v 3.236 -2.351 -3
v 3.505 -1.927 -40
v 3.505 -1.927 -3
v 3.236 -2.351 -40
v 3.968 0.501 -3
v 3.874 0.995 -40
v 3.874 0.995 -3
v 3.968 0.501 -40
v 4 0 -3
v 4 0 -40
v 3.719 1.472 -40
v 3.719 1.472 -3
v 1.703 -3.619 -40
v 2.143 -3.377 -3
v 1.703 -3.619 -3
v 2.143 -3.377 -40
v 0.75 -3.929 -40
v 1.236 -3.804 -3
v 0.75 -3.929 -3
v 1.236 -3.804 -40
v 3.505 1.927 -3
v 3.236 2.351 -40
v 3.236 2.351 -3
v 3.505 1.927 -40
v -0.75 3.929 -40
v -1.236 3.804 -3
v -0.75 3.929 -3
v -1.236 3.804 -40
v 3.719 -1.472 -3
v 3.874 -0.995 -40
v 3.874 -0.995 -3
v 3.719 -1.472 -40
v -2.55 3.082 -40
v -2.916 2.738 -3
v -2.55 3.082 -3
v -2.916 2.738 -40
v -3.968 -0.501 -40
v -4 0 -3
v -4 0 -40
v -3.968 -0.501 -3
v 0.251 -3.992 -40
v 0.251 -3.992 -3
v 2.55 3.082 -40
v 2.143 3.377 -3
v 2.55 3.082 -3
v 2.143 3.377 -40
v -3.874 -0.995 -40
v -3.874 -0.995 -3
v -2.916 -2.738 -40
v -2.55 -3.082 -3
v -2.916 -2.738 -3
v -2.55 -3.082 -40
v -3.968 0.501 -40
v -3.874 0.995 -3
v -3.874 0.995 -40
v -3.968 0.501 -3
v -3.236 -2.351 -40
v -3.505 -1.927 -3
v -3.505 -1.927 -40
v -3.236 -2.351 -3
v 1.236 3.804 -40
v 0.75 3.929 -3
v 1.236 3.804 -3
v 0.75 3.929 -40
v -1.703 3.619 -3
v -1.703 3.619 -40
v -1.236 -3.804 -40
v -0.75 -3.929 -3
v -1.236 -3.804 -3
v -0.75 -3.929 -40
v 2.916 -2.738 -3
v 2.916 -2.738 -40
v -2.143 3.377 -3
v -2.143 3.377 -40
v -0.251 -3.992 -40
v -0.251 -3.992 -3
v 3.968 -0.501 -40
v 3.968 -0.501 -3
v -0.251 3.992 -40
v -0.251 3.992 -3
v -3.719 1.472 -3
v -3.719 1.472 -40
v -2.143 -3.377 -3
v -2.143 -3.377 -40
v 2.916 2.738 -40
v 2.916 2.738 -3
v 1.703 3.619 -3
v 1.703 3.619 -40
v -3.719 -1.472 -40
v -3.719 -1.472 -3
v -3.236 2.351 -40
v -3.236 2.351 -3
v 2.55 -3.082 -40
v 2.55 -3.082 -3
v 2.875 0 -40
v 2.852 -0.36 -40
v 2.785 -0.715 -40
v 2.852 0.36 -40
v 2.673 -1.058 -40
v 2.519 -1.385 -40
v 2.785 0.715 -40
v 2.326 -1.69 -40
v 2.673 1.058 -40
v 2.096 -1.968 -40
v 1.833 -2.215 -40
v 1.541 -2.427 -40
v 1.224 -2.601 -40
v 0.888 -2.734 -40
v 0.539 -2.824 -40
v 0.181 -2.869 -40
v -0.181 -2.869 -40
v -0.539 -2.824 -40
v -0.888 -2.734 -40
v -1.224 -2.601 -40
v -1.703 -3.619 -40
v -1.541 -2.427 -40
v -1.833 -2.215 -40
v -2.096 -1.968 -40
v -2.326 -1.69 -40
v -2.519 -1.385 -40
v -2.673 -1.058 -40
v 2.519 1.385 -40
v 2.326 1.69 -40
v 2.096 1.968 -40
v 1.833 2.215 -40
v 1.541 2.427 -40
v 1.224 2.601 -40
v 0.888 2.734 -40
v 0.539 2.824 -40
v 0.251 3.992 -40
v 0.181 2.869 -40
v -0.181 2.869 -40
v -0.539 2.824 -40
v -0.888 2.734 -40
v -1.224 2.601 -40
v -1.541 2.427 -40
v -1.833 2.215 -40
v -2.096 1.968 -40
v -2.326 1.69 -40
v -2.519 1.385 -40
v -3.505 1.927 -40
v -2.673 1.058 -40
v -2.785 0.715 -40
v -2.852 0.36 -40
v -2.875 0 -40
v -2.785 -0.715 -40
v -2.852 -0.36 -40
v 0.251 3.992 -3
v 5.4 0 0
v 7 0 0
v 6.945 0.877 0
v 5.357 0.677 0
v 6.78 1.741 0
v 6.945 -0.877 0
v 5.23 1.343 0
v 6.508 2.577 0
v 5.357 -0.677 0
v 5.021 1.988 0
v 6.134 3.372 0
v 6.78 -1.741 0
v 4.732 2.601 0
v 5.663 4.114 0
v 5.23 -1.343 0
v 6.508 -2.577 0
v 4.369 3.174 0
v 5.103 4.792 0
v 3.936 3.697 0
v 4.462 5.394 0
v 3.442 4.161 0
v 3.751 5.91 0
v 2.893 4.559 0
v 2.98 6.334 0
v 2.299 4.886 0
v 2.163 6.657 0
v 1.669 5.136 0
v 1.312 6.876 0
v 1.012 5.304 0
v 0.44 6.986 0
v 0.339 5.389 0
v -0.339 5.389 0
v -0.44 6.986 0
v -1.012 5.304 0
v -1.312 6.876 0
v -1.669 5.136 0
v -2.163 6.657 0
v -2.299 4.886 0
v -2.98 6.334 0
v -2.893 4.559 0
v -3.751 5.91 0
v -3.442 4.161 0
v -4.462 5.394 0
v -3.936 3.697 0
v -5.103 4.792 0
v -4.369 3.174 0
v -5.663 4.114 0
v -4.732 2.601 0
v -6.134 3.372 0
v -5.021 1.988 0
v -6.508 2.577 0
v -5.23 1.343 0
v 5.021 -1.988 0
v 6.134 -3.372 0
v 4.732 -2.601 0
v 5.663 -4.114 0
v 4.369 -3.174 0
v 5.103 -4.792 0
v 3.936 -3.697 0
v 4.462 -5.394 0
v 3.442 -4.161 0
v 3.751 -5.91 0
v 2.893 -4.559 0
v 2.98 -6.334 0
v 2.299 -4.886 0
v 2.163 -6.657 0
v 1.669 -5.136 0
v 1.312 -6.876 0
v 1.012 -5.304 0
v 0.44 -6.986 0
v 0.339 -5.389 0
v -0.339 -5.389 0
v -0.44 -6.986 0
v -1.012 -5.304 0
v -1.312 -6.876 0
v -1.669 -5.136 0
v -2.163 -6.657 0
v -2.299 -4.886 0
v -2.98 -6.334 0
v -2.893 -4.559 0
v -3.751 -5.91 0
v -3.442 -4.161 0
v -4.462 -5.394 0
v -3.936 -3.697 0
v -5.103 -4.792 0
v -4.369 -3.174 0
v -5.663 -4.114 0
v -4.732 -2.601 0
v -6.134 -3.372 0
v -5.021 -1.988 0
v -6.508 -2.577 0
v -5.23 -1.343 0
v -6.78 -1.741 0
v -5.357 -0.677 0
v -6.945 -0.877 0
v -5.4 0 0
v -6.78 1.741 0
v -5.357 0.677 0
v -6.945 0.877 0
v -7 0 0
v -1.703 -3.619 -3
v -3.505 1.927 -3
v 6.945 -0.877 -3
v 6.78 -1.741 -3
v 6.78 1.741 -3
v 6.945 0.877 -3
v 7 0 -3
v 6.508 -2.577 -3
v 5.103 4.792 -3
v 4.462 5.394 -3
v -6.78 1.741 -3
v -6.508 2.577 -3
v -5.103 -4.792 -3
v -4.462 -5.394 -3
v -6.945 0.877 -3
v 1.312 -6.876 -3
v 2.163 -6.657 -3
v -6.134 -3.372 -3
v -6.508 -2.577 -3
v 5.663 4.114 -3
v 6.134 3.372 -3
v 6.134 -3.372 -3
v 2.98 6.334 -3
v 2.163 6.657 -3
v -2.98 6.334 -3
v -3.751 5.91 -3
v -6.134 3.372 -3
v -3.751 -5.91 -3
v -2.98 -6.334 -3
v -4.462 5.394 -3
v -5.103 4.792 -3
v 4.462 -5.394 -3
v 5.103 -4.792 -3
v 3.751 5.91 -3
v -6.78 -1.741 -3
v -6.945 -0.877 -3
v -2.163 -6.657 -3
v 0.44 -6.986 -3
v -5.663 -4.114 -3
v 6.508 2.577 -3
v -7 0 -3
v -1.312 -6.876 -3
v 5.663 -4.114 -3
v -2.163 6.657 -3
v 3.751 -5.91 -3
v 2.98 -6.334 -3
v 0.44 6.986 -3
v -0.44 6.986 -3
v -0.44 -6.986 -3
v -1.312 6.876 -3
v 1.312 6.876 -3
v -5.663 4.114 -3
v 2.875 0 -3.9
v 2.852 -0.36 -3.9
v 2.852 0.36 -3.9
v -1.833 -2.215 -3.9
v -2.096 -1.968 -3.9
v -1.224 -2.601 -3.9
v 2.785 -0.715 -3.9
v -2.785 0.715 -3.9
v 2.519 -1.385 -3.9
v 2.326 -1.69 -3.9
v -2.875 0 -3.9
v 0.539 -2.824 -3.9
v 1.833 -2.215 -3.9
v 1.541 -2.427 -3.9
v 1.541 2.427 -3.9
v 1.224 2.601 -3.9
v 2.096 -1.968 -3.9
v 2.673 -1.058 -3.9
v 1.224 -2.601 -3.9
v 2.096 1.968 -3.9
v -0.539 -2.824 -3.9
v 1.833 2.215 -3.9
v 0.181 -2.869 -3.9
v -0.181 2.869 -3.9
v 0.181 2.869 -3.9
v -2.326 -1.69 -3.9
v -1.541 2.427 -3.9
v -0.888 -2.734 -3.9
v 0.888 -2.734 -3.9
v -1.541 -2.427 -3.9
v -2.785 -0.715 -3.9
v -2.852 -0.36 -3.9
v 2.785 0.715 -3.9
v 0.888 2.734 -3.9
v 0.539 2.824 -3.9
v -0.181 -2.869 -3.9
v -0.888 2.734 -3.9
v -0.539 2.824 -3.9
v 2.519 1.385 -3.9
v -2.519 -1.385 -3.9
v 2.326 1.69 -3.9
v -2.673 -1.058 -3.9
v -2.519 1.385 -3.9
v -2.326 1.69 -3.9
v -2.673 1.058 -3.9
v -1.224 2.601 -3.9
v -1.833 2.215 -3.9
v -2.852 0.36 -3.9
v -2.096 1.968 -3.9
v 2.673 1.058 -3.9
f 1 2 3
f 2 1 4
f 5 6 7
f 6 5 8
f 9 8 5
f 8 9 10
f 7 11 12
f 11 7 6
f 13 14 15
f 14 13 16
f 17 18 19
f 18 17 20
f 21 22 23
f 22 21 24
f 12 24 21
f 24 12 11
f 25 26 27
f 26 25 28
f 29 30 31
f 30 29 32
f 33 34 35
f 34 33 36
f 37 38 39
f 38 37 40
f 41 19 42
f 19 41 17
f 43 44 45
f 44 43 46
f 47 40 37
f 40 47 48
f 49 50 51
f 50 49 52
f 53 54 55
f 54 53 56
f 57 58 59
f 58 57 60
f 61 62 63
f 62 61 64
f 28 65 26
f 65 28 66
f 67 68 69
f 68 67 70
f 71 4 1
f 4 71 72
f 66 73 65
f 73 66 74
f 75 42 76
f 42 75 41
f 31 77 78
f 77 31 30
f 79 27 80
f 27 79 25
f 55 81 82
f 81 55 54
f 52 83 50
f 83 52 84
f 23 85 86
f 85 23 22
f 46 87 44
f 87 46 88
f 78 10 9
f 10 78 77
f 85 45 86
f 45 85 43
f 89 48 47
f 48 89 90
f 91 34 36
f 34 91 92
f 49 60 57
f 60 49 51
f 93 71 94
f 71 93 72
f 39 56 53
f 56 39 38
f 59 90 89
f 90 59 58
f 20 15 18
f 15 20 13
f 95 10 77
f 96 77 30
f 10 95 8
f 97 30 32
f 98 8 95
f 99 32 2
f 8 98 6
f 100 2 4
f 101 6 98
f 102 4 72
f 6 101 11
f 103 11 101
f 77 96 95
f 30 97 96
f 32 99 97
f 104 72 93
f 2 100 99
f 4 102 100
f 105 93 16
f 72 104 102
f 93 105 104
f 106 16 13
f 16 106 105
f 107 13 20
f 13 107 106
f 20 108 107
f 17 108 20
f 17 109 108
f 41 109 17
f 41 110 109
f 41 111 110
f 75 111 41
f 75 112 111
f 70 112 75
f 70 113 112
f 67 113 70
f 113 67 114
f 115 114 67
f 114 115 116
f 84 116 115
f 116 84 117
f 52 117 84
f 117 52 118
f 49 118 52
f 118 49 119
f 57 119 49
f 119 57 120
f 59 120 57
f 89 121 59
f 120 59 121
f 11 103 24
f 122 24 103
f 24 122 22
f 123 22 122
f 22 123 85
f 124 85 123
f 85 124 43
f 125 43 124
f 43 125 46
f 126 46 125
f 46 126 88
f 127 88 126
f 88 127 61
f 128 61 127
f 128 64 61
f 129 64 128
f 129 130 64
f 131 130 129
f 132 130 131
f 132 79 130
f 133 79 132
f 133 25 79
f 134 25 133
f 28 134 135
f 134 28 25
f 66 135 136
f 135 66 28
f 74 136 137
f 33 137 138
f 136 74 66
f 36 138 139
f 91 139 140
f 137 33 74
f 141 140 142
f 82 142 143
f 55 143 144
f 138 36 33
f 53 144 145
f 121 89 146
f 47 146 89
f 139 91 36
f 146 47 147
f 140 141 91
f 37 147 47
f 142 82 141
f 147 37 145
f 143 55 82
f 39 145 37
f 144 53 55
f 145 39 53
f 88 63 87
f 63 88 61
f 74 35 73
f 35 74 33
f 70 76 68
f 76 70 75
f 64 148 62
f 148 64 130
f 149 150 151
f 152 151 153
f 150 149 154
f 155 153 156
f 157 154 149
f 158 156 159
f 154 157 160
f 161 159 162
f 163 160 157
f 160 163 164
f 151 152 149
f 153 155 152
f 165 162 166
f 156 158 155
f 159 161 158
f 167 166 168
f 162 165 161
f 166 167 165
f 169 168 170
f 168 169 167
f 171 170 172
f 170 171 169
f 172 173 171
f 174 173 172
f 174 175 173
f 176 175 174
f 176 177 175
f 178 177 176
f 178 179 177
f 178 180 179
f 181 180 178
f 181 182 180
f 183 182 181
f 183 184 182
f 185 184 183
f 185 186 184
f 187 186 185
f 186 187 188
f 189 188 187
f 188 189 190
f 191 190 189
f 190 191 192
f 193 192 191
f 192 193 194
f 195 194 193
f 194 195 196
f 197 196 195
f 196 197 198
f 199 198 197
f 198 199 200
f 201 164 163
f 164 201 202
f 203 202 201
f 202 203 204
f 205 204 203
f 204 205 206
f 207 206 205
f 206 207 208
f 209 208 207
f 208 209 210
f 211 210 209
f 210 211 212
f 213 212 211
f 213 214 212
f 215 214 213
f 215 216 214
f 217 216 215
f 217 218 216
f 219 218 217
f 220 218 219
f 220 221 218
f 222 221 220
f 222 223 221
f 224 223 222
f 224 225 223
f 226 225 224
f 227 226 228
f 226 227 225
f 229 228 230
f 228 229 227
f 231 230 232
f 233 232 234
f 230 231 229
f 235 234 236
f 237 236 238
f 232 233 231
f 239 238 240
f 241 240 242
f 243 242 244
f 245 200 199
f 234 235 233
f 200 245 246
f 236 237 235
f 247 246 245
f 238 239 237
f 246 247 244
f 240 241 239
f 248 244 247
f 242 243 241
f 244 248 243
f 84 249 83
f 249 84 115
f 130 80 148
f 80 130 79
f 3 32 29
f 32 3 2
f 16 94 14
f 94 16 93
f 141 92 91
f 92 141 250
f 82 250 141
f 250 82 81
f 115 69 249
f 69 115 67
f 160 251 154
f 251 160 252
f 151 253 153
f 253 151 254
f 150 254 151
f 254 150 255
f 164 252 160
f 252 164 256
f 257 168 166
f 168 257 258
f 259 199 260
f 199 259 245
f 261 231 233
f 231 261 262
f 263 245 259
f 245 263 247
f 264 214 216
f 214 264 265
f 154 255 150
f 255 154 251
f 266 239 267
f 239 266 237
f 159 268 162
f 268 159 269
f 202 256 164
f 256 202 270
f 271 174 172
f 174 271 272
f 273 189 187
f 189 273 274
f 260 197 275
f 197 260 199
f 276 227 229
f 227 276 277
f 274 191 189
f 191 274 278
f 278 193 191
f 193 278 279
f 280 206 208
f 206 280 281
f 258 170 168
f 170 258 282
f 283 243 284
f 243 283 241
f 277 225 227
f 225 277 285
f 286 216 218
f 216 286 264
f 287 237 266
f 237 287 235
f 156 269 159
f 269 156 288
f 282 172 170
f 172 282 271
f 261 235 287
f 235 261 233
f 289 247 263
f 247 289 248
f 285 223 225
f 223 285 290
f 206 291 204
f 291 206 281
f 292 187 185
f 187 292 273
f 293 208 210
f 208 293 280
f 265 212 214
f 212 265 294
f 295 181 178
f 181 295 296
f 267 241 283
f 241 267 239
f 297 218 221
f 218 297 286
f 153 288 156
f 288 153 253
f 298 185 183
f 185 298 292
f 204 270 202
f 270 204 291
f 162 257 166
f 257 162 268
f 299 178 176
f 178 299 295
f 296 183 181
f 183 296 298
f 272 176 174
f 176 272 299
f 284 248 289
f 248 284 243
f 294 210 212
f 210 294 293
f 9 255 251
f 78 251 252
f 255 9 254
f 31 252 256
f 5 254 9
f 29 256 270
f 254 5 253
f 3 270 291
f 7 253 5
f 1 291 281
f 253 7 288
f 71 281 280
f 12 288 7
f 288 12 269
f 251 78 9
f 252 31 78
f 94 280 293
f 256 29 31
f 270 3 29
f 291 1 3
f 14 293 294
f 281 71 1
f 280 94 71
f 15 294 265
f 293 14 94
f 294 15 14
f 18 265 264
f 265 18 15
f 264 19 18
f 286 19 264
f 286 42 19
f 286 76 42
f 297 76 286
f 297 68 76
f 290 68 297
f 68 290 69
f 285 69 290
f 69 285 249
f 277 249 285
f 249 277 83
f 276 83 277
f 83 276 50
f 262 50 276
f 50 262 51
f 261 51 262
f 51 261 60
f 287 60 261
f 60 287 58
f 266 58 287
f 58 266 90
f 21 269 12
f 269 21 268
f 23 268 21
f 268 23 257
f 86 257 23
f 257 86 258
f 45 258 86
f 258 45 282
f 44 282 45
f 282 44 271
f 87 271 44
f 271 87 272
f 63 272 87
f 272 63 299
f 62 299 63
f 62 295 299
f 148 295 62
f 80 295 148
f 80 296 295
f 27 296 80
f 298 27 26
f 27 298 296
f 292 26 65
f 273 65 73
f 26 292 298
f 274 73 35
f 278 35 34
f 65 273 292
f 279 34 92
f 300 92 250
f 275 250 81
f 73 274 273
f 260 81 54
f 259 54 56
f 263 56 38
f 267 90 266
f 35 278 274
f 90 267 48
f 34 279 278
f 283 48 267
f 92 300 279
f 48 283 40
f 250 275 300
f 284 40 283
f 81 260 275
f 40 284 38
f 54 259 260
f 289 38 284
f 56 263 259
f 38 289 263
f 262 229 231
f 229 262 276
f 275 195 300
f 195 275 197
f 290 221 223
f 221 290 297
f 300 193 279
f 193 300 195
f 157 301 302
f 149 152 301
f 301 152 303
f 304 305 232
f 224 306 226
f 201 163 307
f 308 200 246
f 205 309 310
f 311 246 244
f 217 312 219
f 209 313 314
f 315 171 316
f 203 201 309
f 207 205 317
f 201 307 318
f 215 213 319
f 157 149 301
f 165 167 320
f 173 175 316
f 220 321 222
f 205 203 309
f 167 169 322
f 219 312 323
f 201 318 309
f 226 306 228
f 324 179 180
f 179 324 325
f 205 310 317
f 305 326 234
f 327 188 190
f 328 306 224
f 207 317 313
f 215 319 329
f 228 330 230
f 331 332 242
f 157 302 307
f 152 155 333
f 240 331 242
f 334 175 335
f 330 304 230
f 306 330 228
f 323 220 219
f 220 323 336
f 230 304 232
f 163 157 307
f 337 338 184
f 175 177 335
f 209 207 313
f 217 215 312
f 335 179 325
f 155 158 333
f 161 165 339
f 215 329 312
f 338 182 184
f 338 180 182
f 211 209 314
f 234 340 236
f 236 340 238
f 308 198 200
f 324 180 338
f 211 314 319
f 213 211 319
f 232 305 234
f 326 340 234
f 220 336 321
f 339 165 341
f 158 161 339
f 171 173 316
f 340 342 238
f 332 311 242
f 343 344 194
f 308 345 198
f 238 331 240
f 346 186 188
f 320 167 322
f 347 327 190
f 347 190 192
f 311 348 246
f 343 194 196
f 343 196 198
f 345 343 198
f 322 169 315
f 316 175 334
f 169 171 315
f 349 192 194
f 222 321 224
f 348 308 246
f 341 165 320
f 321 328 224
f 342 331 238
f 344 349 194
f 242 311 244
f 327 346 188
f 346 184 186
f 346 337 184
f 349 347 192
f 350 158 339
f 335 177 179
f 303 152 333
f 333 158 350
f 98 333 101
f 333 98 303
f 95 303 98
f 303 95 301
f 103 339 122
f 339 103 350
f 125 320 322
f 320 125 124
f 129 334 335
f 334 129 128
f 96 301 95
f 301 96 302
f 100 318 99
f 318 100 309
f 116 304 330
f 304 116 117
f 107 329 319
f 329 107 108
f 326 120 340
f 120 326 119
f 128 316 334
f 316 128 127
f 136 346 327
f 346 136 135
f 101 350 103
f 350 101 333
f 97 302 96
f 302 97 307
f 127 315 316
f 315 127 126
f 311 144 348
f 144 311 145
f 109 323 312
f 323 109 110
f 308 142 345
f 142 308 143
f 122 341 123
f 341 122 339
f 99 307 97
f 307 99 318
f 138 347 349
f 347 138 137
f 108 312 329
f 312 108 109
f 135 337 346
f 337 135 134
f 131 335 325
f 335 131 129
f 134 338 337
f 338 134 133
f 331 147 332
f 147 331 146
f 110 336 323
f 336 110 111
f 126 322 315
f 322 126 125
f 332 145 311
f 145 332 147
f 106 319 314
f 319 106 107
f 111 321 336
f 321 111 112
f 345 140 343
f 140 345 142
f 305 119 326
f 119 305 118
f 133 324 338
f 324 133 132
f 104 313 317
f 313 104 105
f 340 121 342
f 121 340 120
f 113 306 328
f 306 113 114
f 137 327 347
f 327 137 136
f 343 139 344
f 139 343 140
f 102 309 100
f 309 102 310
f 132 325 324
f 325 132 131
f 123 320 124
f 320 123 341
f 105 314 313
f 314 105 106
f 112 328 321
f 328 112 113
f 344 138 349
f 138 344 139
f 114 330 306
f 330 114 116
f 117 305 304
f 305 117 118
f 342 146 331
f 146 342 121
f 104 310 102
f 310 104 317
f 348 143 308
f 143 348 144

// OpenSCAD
$fn = 50;


difference() {
	union() {
		translate(v = [0, 0, -40.0000000000]) {
			cylinder(h = 40, r = 4.0000000000);
		}
		translate(v = [0, 0, -3.0000000000]) {
			cylinder(h = 3, r = 7.0000000000);
		}
	}
	union() {
		translate(v = [0, 0, 0]) {
			rotate(a = [0, 0, 0]) {
				difference() {
					union() {
						#translate(v = [0, 0, -40.0000000000]) {
							cylinder(h = 40, r = 2.6000000000);
						}
						#translate(v = [0, 0, -3.9000000000]) {
							cylinder(h = 3.9000000000, r = 4.0000000000, r1 = 2.8750000000, r2 = 5.4000000000);
						}
						#translate(v = [0, 0, -40.0000000000]) {
							cylinder(h = 40, r = 2.8750000000);
						}
						#translate(v = [0, 0, -40.0000000000]) {
							cylinder(h = 40, r = 2.6000000000);
						}
					}
					union();
				}
			}
		}
	}
}
